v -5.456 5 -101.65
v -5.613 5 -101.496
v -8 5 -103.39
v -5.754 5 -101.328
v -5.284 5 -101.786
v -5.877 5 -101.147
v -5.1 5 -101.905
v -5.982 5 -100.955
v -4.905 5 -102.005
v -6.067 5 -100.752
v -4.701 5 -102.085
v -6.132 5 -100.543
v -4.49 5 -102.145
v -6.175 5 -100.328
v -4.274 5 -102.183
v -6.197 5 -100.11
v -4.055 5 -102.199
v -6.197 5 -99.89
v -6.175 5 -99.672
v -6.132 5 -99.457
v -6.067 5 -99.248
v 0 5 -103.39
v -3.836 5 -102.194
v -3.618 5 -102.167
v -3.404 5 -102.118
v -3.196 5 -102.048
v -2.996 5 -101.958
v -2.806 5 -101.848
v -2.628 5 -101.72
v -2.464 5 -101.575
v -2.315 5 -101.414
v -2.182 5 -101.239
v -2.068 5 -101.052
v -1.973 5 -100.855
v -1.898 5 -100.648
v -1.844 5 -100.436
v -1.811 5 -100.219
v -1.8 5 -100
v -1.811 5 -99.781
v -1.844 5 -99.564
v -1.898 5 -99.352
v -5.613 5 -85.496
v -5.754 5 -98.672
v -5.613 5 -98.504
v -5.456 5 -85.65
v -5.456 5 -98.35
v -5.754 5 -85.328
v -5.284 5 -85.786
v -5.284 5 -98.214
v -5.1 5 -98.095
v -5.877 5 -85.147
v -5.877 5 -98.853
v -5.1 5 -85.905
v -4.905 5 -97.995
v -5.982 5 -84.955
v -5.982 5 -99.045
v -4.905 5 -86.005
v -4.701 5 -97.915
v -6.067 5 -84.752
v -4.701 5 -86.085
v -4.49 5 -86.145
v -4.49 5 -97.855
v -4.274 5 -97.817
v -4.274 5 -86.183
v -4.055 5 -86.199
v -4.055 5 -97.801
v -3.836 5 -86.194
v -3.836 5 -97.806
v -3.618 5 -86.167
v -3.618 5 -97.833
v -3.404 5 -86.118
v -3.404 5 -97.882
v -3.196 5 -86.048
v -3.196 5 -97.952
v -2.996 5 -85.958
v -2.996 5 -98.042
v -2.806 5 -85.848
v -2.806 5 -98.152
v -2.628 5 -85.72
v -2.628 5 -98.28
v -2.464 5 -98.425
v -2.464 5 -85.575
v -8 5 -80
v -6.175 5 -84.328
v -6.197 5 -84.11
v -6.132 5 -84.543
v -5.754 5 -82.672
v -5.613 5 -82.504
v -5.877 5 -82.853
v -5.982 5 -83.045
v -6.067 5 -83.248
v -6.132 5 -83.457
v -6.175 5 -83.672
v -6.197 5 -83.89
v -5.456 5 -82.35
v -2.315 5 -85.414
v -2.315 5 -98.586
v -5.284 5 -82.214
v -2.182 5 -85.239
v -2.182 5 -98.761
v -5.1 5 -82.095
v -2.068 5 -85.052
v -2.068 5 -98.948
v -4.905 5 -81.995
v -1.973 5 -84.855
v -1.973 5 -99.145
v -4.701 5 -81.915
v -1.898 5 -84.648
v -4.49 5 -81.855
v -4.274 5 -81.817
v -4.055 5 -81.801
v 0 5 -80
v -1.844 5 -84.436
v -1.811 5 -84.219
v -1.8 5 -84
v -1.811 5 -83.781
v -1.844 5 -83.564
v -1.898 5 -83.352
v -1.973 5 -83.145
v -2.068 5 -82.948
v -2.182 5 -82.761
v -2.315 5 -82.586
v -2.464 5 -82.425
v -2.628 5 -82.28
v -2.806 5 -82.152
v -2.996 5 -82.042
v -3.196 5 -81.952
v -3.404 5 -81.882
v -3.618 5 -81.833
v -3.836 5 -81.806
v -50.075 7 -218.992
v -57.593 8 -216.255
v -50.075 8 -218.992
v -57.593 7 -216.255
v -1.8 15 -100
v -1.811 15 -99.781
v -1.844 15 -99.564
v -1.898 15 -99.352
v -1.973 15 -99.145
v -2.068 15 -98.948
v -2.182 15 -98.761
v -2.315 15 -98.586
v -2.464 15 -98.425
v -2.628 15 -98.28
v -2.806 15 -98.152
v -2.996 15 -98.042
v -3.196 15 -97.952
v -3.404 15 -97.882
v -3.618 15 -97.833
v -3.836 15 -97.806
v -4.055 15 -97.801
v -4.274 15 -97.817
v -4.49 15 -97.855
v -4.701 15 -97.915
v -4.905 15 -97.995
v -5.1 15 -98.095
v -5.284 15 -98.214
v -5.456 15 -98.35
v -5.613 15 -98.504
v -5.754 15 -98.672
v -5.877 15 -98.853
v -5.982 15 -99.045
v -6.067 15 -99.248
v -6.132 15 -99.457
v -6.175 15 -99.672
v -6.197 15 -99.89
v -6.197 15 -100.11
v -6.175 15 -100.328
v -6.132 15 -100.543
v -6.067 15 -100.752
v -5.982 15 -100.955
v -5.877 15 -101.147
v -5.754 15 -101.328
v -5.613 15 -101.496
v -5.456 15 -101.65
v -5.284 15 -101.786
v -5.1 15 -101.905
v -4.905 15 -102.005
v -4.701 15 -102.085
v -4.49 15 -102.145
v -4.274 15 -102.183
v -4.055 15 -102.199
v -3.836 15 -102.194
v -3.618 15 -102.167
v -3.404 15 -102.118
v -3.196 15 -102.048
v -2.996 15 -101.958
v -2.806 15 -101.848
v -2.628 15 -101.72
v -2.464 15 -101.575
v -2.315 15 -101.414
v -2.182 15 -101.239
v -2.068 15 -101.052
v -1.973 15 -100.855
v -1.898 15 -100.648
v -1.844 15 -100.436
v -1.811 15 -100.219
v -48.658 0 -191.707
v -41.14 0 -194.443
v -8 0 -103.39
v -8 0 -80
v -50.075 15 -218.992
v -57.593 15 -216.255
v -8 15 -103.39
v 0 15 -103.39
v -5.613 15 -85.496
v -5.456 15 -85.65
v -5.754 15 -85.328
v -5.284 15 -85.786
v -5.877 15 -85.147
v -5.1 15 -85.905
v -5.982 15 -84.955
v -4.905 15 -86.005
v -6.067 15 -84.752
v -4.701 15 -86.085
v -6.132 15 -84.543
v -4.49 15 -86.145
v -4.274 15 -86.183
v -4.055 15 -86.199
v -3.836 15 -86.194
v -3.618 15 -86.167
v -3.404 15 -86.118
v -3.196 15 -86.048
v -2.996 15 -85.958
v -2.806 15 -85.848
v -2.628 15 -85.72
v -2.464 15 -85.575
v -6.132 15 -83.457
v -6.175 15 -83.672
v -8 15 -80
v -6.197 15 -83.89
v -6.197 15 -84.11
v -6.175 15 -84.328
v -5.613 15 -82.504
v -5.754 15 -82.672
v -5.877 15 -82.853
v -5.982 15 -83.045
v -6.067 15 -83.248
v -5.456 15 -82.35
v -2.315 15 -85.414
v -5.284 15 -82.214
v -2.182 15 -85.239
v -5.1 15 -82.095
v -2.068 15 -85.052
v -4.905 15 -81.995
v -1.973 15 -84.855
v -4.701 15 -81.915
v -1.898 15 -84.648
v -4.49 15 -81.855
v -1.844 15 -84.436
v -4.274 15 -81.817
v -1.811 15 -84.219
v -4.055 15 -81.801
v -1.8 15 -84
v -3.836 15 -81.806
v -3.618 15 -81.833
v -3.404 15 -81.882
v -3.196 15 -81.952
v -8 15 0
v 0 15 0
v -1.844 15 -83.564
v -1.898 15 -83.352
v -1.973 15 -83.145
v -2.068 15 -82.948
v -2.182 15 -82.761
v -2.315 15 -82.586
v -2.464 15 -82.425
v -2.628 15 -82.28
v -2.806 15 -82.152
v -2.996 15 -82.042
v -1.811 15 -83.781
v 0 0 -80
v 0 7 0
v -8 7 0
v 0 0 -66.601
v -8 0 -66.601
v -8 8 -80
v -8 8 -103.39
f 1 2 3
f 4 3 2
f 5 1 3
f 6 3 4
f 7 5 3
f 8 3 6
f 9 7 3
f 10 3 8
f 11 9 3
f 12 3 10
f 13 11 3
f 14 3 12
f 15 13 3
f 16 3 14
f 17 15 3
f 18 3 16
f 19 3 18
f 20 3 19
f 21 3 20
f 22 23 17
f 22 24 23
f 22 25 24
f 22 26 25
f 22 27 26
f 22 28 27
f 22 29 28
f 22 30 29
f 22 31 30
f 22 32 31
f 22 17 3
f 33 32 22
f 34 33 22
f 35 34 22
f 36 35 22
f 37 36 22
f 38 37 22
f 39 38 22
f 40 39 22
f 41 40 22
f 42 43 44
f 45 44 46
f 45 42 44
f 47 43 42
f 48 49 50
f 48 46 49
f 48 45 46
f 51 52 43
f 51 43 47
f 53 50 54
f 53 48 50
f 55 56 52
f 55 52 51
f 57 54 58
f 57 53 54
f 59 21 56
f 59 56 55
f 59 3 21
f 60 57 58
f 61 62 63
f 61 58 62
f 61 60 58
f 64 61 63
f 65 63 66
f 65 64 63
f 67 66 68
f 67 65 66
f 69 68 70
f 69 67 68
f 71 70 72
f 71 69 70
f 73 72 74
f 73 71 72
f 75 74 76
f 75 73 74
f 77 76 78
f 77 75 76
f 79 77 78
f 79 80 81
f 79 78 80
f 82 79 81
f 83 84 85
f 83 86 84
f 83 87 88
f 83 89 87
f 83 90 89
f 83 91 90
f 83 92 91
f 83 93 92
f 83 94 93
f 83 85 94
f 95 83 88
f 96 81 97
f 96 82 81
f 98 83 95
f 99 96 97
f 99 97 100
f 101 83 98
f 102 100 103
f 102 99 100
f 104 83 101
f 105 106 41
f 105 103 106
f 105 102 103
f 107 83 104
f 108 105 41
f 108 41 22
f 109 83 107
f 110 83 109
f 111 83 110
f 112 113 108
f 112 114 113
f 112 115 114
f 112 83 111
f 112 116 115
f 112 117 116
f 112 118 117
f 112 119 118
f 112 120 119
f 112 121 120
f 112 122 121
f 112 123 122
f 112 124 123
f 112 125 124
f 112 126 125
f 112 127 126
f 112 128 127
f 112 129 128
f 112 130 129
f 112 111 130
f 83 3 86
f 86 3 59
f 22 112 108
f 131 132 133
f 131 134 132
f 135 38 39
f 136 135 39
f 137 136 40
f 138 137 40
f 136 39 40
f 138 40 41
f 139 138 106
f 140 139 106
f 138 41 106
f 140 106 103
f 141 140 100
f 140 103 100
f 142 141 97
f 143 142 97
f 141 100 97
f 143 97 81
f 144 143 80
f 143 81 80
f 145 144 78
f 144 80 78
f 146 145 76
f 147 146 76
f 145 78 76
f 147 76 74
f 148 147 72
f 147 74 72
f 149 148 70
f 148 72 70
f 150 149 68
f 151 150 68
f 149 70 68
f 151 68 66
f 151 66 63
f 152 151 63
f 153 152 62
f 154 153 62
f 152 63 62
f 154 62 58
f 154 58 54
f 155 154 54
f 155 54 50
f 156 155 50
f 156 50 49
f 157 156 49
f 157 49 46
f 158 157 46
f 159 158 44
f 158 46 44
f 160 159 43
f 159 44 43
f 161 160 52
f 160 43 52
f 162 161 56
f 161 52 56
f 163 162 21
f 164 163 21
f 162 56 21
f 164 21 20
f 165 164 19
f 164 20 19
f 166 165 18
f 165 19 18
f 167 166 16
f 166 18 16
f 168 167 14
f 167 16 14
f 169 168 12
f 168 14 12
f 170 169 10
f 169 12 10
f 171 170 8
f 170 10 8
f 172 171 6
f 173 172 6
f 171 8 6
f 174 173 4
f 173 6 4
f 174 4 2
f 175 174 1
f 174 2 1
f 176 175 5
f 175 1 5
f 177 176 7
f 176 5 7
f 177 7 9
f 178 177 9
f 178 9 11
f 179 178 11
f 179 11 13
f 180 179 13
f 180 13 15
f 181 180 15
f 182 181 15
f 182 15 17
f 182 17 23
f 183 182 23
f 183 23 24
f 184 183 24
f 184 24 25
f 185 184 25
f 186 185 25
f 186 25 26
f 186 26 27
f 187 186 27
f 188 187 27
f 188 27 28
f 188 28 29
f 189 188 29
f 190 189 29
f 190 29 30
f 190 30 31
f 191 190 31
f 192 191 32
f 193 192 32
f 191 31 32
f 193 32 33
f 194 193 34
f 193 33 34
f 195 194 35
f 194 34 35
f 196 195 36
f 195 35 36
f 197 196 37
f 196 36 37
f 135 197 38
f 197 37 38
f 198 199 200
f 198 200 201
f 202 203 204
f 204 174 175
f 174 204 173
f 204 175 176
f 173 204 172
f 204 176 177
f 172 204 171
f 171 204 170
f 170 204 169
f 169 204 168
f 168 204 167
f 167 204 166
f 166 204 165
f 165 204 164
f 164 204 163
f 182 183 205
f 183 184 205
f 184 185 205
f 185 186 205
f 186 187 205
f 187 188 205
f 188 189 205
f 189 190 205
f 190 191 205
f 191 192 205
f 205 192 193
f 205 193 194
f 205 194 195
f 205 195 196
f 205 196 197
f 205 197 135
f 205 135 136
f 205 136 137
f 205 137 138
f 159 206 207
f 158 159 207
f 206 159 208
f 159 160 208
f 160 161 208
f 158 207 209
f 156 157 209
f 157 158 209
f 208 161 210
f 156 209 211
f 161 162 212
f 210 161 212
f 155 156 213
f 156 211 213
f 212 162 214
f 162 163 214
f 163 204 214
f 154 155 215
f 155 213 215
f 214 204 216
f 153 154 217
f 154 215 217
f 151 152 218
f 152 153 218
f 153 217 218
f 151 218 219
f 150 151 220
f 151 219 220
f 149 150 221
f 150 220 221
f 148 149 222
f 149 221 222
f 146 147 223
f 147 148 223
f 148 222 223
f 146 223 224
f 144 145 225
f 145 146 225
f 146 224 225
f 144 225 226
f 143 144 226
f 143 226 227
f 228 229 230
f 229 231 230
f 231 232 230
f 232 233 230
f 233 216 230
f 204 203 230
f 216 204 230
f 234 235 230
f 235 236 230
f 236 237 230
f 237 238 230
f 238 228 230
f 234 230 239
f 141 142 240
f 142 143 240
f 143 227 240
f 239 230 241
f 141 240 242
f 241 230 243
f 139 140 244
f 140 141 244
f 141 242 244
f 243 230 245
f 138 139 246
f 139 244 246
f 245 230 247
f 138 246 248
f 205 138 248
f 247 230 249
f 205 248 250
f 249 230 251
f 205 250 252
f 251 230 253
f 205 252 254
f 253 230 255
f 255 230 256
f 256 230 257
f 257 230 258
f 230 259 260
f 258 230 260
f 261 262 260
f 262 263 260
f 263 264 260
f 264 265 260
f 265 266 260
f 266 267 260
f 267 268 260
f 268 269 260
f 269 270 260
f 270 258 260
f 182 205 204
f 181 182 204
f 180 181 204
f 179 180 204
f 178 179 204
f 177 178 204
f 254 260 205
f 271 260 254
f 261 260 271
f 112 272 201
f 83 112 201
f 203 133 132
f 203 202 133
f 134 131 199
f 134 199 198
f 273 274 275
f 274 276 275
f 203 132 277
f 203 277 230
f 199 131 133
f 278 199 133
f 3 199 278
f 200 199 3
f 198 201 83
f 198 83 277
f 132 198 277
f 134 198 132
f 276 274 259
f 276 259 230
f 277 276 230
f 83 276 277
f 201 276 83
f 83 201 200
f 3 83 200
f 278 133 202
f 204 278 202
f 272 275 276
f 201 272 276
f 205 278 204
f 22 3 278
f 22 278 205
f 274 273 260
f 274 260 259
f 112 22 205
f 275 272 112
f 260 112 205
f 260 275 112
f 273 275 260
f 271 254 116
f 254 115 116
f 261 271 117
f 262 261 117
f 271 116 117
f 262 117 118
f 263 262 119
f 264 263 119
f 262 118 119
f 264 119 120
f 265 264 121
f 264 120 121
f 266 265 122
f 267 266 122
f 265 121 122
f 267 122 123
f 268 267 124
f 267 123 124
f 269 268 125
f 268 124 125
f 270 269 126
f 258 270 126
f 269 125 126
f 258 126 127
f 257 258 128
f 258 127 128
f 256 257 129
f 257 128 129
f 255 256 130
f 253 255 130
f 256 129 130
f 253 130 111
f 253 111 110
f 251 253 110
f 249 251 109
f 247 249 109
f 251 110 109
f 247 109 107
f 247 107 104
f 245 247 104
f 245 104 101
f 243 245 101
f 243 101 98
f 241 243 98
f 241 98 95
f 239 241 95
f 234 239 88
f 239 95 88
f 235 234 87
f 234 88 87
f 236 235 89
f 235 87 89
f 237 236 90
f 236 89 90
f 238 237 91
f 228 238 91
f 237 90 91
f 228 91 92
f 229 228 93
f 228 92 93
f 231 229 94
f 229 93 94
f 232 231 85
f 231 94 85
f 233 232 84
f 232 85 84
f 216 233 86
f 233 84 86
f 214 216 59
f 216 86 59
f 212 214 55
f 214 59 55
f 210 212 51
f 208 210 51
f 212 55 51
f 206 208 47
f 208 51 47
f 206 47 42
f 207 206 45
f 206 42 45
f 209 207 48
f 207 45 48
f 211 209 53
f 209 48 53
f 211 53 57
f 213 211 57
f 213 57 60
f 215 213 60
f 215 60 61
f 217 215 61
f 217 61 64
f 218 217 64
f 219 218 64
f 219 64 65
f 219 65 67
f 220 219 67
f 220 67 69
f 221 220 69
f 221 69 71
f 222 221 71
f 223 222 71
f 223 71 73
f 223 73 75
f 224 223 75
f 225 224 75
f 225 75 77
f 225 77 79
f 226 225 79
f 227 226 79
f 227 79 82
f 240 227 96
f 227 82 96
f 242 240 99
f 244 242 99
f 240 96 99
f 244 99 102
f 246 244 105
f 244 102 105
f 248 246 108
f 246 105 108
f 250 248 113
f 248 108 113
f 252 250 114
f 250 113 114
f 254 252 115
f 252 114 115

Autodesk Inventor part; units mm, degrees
ref_plane "YZ Plane" through (0, 0, 0) normal (1, 0, 0) x (0, 1, 0)
ref_plane "XZ Plane" through (0, 0, 0) normal (0, 1, 0) x (-1, 0, 0)
ref_plane "XY Plane" through (0, 0, 0) normal (0, 0, 1) x (1, 0, 0)
sketch "Sketch1" plane through (0, 0, 0) normal (0, 1, 0) x (-1, 0, 0)
  line L0 (0, 0) -> (8, 0)
  line L1 (8, 0) -> (8, -80)
  line L2 (0, -80) -> (0, 0)
  line L3 (8, -80) -> (57.5929, -216.2554)
  line L4 (8, -80) -> (153, -80) construction
  line L5 (57.5929, -216.2554) -> (50.0754, -218.9916)
  line L6 (50.0754, -218.9916) -> (0.4825, -82.7362)
  line L7 (0.4825, -82.7362) -> (0, -81.4106)
  line L8 (0, -81.4106) -> (0, -80)
  dimension "d3" = 8
  dimension "d4" = 80
  dimension "d6" = 70
  dimension "d7" = 8
extrude "Extrusion1" add sketch "Sketch1" along normal blind 8
sketch "Sketch2" plane through (-8, 0, 0) normal (0, 0, 1) x (1, 0, 0)
  line L0 (8, 8) -> (8, 15)
  line L1 (8, 8) -> (0, 8)
  line L2 (8, 8) -> (-42.0754, 8) projected
  line L3 (0, 8) -> (0, 15)
  line L4 (0, 15) -> (8, 15)
  point P0 (8, 0)
  dimension "d10" = 7
  dimension "d11" = 8
extrude "Extrusion2" add sketch "Sketch2" against normal blind 80
sketch "Sketch3" plane through (-57.5929, 0, -216.2554) normal (-0.342, 0, -0.9397) x (-0.9397, 0, 0.342)
  line L0 (-8, 0) -> (-8, 8) projected
  line L1 (0, 0) -> (0, 8) projected
  line L2 (-8, 8) -> (0, 8)
  line L3 (-7.5175, 15) -> (-7.5175, 8) projected
  line L4 (-8, 8) -> (-8, 15)
  line L5 (0, 8) -> (0, 15)
  line L6 (0, 15) -> (-8, 15)
  point P0 (19.8441, 0)
  dimension "d14" = 8
extrude "Extrusion3" add sketch "Sketch3" against normal blind 145
sketch "Sketch8" plane through (0, 0, 0) normal (0, -1, 0) x (1, 0, 0)
  line L0 (-8, -80) -> (-8, 0) projected
  line L1 (-8, -80) -> (0, -80)
  line L2 (0, -80) -> (0, -104)
  line L3 (0, -104) -> (-8, -104)
  line L4 (-8, -104) -> (-8, -80)
  circle A0 centre (-4, -100) radius 2.2
  circle A1 centre (-4, -84) radius 2.2
  point P0 (0, 0)
  point P1 (-4, -80)
  point P2 (-4, -104)
  dimension "d24" = 24
  dimension "d25" = 4.4
  dimension "d26" = 4.4
  dimension "d27" = 4
  dimension "d28" = 4
extrude "Extrusion7" add sketch "Sketch8" against normal blind 15
sketch "Sketch9" plane through (0, 15, 0) normal (0, 1, 0) x (1, 0, 0)
  line L0 (0, 80) -> (0, 104) projected
  line L1 (-8, 80) -> (-0.4825, 82.7362) projected
  line L2 (0, 104) -> (-8, 104)
  line L3 (-8, 104) -> (-8, 80)
  line L4 (-8, 80) -> (0, 80)
  line L5 (0, 80) -> (0, 104)
  point P0 (0, 0)
extrude "Extrusion8" cut sketch "Sketch9" along normal blind 145
extrude "Extrusion9" cut sketch "Sketch8" against normal blind 24 contours A1
sketch "Sketch10" plane through (0, 0, 0) normal (0, -1, 0) x (1, 0, 0)
  line L0 (0, -104) -> (-8, -104) projected
  line L1 (0, 0) -> (0, -104) projected
  line L2 (-8, -104) -> (0, -104)
  line L3 (0, -104) -> (0, -80)
  line L4 (0, -80) -> (-8, -80)
  line L5 (-8, -80) -> (-8, -104)
  dimension "d47" = 24
extrude "Extrusion10" cut sketch "Sketch10" against normal blind 5
sketch "Sketch11" plane through (0, 5, 0) normal (0, -1, 0) x (1, 0, 0)
  line L0 (0, -104) -> (-8, -104) projected
  line L1 (-50.0754, -218.9916) -> (-8, -103.3904) projected
  line L2 (0, -104) -> (-8, -104)
  line L3 (-8, -104) -> (-8, -103.3904)
  line L4 (-8, -103.3904) -> (0, -103.3904)
  line L5 (0, -103.3904) -> (0, -104)
  point P0 (0, 0)
extrude "Extrusion11" cut sketch "Sketch11" against normal blind 13
chamfer "Chamfer3" distance 7 angle 84 1 edges at (-4, 0, 0) measured on face at (-5.3333, 5, 0)
chamfer "Chamfer4" distance 7 angle 75 1 edges at (-53.8342, 0, -217.6235) measured on face at (-55.0871, 5, -217.1675)
properties part number "intake arm right"
